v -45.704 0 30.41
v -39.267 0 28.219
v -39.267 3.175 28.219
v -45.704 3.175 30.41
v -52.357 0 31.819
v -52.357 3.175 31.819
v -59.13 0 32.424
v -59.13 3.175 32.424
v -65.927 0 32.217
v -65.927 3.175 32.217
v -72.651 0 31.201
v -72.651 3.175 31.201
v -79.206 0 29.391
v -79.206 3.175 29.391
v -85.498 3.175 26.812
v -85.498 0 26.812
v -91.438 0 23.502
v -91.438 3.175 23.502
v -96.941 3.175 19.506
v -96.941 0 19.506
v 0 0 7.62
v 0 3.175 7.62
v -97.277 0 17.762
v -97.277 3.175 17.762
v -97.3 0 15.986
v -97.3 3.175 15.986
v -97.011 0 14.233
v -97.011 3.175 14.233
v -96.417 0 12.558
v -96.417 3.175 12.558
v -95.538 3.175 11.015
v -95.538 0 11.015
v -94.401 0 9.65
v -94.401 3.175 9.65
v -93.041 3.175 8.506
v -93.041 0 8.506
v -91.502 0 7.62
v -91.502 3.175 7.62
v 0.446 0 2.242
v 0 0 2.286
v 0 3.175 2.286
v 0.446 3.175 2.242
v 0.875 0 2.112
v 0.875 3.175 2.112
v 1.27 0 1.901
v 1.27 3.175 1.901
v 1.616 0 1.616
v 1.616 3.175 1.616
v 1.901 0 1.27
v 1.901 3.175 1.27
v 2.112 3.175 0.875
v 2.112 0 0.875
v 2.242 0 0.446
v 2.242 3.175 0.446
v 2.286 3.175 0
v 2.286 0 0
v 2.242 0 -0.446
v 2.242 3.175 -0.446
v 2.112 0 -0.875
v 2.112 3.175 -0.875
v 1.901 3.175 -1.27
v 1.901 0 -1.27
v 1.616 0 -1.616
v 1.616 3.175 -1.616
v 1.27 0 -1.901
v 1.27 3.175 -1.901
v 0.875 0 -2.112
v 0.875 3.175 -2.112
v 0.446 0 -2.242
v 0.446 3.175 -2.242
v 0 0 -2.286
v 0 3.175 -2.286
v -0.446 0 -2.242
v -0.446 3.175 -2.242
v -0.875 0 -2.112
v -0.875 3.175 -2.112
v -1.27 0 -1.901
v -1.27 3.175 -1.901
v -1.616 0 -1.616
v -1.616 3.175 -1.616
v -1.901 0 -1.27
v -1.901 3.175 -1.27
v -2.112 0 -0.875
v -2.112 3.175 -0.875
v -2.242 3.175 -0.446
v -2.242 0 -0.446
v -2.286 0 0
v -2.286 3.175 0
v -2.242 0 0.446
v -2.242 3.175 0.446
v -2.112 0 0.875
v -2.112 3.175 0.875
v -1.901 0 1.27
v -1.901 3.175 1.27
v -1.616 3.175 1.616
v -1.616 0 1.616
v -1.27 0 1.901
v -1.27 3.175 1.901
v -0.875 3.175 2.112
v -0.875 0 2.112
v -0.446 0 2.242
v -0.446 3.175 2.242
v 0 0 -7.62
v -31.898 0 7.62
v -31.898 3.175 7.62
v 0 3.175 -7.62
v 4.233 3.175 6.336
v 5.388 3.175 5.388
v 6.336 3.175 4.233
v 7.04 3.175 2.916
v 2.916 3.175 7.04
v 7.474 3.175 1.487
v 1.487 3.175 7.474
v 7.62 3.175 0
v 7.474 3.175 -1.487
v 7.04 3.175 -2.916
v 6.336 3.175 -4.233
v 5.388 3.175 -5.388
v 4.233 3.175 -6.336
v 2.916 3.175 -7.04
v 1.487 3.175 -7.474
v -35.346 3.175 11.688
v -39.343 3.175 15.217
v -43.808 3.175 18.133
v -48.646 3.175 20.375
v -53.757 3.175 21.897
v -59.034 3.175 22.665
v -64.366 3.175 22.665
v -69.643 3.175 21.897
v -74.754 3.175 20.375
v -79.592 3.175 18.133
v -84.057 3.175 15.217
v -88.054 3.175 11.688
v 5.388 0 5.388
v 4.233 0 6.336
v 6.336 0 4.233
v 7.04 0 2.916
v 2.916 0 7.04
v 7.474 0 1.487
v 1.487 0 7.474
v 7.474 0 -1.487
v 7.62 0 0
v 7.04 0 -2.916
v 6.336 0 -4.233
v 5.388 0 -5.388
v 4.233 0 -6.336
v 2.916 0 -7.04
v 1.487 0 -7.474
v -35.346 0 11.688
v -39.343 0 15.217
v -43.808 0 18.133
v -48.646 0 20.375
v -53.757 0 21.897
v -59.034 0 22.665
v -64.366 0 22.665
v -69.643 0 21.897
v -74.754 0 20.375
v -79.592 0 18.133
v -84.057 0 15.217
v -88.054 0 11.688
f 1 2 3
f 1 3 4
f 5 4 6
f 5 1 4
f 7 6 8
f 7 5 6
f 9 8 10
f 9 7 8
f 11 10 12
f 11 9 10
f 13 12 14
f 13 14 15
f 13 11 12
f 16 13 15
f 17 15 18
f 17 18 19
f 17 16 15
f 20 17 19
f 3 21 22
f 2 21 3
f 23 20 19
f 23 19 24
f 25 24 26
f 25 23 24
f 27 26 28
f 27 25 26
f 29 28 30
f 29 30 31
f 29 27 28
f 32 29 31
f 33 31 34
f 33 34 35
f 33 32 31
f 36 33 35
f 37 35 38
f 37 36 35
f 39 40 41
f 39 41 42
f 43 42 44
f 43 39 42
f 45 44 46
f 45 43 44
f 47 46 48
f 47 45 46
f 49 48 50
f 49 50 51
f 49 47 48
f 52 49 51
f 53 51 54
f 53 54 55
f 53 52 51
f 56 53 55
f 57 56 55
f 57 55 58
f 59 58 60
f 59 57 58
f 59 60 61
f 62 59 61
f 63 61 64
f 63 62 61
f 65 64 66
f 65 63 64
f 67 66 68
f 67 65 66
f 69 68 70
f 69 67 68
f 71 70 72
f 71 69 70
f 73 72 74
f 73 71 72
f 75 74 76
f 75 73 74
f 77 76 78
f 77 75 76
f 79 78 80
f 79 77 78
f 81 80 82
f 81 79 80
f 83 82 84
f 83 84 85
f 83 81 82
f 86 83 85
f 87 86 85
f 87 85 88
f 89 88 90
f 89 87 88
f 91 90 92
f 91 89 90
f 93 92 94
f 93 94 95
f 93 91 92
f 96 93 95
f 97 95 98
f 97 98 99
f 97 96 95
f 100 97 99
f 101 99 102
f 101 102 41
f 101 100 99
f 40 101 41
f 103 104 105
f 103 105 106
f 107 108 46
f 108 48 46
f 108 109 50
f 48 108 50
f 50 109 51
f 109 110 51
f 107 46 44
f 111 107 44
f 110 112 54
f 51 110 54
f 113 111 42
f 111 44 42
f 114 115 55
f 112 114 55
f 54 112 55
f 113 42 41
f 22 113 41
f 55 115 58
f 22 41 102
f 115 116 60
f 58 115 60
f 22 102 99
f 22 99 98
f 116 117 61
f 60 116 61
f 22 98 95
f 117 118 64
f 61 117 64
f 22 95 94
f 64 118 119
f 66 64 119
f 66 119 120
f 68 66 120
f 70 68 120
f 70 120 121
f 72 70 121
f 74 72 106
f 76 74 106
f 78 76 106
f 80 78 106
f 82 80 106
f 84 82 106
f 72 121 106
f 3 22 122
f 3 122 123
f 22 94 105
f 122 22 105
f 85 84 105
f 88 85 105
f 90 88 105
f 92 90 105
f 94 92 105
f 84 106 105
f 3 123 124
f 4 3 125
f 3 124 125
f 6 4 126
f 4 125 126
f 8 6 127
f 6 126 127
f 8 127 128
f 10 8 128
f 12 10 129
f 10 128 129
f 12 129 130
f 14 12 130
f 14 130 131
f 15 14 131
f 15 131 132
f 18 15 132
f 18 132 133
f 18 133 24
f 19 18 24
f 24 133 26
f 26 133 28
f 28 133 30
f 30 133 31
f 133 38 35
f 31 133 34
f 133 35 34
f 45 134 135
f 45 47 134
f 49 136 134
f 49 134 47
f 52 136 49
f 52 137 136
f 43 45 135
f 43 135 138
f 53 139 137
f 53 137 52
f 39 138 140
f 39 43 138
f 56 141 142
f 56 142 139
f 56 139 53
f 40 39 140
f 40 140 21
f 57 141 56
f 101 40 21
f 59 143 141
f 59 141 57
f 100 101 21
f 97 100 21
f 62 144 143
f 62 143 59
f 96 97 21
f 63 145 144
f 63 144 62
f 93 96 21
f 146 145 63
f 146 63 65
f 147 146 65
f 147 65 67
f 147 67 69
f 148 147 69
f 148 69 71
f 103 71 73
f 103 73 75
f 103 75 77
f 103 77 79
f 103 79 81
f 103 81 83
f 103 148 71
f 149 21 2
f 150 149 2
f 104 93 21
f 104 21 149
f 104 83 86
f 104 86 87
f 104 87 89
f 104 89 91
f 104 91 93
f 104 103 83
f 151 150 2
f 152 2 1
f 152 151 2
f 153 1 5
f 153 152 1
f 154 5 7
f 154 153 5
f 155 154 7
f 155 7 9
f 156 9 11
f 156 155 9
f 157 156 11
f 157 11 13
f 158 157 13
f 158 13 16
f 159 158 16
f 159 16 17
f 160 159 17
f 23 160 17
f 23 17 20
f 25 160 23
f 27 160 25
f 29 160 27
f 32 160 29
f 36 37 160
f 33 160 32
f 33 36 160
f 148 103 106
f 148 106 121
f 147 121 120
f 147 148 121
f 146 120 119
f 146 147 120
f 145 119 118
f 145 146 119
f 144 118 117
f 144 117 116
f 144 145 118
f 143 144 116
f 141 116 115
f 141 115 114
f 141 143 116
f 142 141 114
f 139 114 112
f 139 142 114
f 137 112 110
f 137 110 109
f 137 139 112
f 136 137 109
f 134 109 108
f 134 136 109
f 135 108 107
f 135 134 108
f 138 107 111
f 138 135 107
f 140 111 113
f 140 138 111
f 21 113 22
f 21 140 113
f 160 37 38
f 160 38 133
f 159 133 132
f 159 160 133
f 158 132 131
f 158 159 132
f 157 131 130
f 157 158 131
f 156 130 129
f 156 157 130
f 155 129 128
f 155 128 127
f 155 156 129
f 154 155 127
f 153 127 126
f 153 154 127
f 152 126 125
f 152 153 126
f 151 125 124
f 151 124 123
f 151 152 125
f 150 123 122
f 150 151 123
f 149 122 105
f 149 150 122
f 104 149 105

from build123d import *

# Parameters (mm, degrees)
SKETCH1_R           = 2.286
BOSS_EXTRUDE1_DEPTH = 3.175


with BuildPart() as part:
    # Sketch1 → Boss-Extrude1 (new body)
    with BuildSketch(Plane(origin=(0, 0, 0), x_dir=(1, 0, 0), z_dir=(0, 1, 0))):
        with BuildLine():
            Line((-31.898482314, -7.62), (0, 7.62))
            ThreePointArc((0, 7.62), (7.62, 0), (0, -7.62))
            Line((0, -7.62), (-39.266643524, -28.218839839))
            ThreePointArc((-39.266643524, -28.218839839), (-69.304091982, -31.809710463), (-96.940525037, -19.506449524))
            ThreePointArc((-96.940525037, -19.506449524), (-96.41727765, -12.558332827), (-91.501691991, -7.62))
            ThreePointArc((-91.501691991, -7.62), (-61.700087152, -22.761590746), (-31.898482314, -7.62))
        make_face()
        with Locations(Location((0, 0, 0), (0, 0, 270))):
            Circle(SKETCH1_R, mode=Mode.SUBTRACT)
    extrude(amount=BOSS_EXTRUDE1_DEPTH)


solid = part.part
